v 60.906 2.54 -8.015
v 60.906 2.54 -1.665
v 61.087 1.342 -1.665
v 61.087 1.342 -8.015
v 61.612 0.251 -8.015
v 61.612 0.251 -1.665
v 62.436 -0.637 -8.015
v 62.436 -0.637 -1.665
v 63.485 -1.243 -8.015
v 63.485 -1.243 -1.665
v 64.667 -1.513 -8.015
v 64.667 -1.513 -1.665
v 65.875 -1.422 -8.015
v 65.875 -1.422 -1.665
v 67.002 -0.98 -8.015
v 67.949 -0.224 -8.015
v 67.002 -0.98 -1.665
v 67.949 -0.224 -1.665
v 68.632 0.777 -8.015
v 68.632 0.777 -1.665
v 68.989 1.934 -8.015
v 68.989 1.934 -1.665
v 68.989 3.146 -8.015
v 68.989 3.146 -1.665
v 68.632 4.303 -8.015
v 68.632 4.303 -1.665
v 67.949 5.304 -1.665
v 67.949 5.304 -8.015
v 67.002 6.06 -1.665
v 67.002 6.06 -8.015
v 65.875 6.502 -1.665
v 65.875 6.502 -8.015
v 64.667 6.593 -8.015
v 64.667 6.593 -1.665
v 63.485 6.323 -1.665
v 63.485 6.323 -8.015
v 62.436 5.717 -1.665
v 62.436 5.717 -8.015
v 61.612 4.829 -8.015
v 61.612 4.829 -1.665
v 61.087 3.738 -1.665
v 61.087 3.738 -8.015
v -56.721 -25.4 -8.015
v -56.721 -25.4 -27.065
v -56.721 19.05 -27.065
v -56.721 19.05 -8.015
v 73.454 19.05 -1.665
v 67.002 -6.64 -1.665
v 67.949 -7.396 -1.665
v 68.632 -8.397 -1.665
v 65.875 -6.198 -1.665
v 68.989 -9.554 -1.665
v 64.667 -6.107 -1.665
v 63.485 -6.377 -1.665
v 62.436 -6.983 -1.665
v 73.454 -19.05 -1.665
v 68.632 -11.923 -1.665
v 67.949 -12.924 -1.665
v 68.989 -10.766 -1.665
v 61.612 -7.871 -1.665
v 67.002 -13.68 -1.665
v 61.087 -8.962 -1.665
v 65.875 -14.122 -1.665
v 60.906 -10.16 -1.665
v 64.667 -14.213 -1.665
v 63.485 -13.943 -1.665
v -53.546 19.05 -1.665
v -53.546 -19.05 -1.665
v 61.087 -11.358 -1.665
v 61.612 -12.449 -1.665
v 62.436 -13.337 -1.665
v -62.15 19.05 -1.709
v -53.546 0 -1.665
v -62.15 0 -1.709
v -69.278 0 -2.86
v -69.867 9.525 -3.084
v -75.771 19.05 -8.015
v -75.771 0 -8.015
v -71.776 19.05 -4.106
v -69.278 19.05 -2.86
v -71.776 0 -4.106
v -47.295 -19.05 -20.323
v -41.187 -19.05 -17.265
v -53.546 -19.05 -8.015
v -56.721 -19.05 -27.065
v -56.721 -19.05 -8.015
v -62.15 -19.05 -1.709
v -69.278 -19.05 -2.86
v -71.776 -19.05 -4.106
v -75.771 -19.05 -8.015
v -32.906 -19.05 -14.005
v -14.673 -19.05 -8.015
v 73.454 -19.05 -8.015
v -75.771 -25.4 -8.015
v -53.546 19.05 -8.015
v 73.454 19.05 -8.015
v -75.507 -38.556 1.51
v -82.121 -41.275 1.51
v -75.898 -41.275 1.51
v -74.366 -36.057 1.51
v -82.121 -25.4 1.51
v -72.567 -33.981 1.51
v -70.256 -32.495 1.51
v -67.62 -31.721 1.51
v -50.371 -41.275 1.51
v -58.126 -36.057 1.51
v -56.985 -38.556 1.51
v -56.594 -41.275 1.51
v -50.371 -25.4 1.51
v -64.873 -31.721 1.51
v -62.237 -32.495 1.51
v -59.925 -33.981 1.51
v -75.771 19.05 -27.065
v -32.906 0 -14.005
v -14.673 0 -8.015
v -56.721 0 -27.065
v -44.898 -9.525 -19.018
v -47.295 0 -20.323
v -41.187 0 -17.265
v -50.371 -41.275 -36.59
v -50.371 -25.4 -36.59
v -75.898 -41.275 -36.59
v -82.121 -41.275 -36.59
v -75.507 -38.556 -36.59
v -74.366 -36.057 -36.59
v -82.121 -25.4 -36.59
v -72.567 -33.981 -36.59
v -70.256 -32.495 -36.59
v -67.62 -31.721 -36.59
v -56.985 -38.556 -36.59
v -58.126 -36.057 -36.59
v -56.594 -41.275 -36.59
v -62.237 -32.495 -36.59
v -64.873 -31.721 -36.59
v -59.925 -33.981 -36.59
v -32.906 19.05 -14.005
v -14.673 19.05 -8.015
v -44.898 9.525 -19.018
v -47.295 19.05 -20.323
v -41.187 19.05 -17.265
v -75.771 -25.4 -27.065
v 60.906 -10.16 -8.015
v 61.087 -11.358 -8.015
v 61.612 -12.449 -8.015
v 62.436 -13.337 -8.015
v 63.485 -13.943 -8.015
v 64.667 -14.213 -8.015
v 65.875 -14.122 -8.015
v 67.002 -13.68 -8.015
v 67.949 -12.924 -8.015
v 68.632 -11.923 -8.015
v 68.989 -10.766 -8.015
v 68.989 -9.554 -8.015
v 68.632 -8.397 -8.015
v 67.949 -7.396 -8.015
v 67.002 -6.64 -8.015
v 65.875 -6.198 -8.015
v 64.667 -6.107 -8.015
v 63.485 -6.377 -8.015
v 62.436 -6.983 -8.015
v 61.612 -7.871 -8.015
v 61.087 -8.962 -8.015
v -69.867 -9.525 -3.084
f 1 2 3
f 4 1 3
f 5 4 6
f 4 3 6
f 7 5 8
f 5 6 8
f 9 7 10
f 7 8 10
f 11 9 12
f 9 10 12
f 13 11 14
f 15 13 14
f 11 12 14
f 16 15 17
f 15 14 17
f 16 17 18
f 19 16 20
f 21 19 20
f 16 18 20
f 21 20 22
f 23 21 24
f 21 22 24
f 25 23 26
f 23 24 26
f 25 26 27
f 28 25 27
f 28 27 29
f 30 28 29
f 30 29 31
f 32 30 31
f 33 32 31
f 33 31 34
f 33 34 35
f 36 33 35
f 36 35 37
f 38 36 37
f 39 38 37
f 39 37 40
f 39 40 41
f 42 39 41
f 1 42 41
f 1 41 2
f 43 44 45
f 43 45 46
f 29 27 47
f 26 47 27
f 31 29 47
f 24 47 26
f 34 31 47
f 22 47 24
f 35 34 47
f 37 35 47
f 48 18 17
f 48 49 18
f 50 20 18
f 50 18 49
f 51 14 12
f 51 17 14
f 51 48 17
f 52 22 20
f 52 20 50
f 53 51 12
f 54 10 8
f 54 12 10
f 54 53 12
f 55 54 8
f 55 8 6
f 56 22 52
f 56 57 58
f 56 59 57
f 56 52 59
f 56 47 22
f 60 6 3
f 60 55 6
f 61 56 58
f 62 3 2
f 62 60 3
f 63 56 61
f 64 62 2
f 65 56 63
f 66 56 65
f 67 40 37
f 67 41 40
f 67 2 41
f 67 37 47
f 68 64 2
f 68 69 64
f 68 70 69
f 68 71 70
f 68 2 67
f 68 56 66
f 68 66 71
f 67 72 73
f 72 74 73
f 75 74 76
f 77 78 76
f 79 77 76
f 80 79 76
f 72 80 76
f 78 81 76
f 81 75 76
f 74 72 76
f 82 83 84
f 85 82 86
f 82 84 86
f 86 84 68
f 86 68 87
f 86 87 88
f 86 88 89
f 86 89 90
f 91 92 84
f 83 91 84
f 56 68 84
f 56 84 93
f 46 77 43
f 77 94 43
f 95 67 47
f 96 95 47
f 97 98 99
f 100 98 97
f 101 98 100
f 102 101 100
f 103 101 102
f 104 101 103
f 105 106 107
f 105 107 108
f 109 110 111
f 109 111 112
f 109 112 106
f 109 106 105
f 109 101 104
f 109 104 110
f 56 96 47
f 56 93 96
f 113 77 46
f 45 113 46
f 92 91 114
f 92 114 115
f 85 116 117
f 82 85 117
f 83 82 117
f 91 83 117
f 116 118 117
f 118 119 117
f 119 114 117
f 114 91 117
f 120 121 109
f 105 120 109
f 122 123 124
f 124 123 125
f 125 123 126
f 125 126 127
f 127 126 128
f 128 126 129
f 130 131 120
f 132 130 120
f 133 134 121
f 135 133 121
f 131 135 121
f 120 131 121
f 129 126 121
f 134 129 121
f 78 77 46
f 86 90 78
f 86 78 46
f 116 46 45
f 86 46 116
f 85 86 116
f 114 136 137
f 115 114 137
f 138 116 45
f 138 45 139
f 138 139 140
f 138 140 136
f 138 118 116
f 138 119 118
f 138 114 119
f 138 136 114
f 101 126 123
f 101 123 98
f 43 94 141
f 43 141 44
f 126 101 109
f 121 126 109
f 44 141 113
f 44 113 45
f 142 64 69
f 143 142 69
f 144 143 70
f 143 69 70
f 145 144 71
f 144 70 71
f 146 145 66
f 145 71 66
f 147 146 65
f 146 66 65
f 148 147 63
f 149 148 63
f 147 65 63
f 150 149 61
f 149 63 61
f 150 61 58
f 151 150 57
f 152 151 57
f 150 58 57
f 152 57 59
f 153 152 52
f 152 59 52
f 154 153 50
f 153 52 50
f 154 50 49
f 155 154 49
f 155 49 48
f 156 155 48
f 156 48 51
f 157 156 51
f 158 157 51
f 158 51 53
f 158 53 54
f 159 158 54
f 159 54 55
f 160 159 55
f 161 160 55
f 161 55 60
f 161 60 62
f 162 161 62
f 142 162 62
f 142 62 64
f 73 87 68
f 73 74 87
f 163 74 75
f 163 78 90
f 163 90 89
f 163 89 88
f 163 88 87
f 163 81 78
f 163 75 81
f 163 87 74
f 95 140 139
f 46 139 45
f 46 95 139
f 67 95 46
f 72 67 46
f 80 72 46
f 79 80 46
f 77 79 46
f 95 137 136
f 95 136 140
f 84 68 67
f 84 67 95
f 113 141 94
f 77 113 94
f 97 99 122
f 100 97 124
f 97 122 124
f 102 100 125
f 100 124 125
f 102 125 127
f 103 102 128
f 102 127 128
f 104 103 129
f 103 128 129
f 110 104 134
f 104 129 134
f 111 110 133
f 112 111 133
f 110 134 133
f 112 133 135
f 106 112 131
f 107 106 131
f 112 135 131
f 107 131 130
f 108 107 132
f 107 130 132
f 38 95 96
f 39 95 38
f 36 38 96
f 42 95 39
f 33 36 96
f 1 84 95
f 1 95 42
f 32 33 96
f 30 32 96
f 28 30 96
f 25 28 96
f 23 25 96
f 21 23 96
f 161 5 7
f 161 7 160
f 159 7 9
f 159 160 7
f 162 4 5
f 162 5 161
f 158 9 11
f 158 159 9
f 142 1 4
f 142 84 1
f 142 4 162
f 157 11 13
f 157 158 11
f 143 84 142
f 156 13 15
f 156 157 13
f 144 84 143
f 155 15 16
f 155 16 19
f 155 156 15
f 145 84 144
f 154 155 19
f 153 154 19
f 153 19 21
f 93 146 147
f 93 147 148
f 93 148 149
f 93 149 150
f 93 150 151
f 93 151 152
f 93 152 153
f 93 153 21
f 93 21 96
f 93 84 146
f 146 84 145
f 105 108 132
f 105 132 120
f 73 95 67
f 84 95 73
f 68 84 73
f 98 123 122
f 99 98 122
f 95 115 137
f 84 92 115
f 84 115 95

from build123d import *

# Parameters (mm, degrees)
F1_DEPTH      = 19.05
F2_DEPTH      = 19.05
F0_W          = 19.05
F0_H          = 19.05
F3_DEPTH      = 25.4
F3_DEPTH_BACK = 19.05
F4_W          = 31.75
F4_H          = 38.1
F4_W_2        = 19.05
F4_H_2        = 19.05
F5_DEPTH      = 15.875
F7_D          = 19.304
F9_D          = 8.128


with BuildPart() as f1:
    # F0 (on Front) → F1 (new body, symmetric)
    with BuildSketch(Plane.XZ):
        Polygon((73.453836826, -1.6650080707), (-53.546163174, -1.6650080707), (-53.546163174, -8.0150080707), (-14.6733894944, -8.0150080707), (73.453836826, -8.0150080707), align=None)
    extrude(amount=F1_DEPTH, both=True)

    # F9 (through all)
    with Locations(Plane(origin=(0, 0, -8.0150080707), x_dir=(1, 0, 0), z_dir=(0, 0, -1))):
        with Locations((64.970236826, 10.16), (64.970236826, -2.54)):
            Hole(F9_D / 2)


with BuildPart() as f2:
    # F0 (on Front) → F2 (new body, symmetric)
    with BuildSketch(Plane.XZ):
        with BuildLine():
            add(Edge.make_bspline(
                [(-75.771163174, -8.0150080707), (-74.1607508996, -6.1029628681), (-70.2003043439, -1.40071801), (-59.7481949502, -1.5665859823), (-53.546163174, -1.6650080707)],
                knots=[0, 0, 0, 0, 0.4066239127, 1, 1, 1, 1], degree=3))
            Line((-75.771163174, -8.0150080707), (-56.721163174, -8.0150080707))
            Line((-56.721163174, -8.0150080707), (-56.721163174, -27.0650080707))
            add(Edge.make_bspline(
                [(-56.721163174, -27.0650080707), (-53.3356832439, -24.3351180324), (-44.8730943092, -17.5112887062), (-25.9976593517, -11.5759185238), (-14.6733894944, -8.0150080707)],
                knots=[0, 0, 0, 0, 0.4000525083, 1, 1, 1, 1], degree=3))
            Line((-14.6733894944, -8.0150080707), (-53.546163174, -8.0150080707))
            Line((-53.546163174, -8.0150080707), (-53.546163174, -1.6650080707))
        make_face()
    extrude(amount=F2_DEPTH, both=True)


with BuildPart() as f3:
    # F0 (on Front) → F3 (new body, two sides)
    with BuildSketch(Plane.XZ) as f3_sk:
        with Locations((-66.246163174, -17.5400080707)):
            Rectangle(F0_W, F0_H)
    extrude(amount=F3_DEPTH)
    extrude(f3_sk.sketch, amount=-F3_DEPTH_BACK)


with BuildPart() as f5:
    # F4 (on face) → F5 (new body)
    with BuildSketch(Plane.XZ.offset(25.4)):
        with Locations((-66.246163174, -17.5400080707)):
            Rectangle(F4_W, F4_H)
        with Locations((-66.246163174, -17.5400080707)):
            Rectangle(F4_W_2, F4_H_2, mode=Mode.SUBTRACT)
        with Locations((-66.246163174, -17.5400080707)):
            Rectangle(F4_W_2, F4_H_2)
    extrude(amount=F5_DEPTH)

    # F7 (through all)
    with Locations(Plane.XY.offset(1.5099919293)):
        with Locations((-66.246163174, -41.275)):
            Hole(F7_D / 2)


solid = Compound([f1.part, f2.part, f3.part, f5.part])
